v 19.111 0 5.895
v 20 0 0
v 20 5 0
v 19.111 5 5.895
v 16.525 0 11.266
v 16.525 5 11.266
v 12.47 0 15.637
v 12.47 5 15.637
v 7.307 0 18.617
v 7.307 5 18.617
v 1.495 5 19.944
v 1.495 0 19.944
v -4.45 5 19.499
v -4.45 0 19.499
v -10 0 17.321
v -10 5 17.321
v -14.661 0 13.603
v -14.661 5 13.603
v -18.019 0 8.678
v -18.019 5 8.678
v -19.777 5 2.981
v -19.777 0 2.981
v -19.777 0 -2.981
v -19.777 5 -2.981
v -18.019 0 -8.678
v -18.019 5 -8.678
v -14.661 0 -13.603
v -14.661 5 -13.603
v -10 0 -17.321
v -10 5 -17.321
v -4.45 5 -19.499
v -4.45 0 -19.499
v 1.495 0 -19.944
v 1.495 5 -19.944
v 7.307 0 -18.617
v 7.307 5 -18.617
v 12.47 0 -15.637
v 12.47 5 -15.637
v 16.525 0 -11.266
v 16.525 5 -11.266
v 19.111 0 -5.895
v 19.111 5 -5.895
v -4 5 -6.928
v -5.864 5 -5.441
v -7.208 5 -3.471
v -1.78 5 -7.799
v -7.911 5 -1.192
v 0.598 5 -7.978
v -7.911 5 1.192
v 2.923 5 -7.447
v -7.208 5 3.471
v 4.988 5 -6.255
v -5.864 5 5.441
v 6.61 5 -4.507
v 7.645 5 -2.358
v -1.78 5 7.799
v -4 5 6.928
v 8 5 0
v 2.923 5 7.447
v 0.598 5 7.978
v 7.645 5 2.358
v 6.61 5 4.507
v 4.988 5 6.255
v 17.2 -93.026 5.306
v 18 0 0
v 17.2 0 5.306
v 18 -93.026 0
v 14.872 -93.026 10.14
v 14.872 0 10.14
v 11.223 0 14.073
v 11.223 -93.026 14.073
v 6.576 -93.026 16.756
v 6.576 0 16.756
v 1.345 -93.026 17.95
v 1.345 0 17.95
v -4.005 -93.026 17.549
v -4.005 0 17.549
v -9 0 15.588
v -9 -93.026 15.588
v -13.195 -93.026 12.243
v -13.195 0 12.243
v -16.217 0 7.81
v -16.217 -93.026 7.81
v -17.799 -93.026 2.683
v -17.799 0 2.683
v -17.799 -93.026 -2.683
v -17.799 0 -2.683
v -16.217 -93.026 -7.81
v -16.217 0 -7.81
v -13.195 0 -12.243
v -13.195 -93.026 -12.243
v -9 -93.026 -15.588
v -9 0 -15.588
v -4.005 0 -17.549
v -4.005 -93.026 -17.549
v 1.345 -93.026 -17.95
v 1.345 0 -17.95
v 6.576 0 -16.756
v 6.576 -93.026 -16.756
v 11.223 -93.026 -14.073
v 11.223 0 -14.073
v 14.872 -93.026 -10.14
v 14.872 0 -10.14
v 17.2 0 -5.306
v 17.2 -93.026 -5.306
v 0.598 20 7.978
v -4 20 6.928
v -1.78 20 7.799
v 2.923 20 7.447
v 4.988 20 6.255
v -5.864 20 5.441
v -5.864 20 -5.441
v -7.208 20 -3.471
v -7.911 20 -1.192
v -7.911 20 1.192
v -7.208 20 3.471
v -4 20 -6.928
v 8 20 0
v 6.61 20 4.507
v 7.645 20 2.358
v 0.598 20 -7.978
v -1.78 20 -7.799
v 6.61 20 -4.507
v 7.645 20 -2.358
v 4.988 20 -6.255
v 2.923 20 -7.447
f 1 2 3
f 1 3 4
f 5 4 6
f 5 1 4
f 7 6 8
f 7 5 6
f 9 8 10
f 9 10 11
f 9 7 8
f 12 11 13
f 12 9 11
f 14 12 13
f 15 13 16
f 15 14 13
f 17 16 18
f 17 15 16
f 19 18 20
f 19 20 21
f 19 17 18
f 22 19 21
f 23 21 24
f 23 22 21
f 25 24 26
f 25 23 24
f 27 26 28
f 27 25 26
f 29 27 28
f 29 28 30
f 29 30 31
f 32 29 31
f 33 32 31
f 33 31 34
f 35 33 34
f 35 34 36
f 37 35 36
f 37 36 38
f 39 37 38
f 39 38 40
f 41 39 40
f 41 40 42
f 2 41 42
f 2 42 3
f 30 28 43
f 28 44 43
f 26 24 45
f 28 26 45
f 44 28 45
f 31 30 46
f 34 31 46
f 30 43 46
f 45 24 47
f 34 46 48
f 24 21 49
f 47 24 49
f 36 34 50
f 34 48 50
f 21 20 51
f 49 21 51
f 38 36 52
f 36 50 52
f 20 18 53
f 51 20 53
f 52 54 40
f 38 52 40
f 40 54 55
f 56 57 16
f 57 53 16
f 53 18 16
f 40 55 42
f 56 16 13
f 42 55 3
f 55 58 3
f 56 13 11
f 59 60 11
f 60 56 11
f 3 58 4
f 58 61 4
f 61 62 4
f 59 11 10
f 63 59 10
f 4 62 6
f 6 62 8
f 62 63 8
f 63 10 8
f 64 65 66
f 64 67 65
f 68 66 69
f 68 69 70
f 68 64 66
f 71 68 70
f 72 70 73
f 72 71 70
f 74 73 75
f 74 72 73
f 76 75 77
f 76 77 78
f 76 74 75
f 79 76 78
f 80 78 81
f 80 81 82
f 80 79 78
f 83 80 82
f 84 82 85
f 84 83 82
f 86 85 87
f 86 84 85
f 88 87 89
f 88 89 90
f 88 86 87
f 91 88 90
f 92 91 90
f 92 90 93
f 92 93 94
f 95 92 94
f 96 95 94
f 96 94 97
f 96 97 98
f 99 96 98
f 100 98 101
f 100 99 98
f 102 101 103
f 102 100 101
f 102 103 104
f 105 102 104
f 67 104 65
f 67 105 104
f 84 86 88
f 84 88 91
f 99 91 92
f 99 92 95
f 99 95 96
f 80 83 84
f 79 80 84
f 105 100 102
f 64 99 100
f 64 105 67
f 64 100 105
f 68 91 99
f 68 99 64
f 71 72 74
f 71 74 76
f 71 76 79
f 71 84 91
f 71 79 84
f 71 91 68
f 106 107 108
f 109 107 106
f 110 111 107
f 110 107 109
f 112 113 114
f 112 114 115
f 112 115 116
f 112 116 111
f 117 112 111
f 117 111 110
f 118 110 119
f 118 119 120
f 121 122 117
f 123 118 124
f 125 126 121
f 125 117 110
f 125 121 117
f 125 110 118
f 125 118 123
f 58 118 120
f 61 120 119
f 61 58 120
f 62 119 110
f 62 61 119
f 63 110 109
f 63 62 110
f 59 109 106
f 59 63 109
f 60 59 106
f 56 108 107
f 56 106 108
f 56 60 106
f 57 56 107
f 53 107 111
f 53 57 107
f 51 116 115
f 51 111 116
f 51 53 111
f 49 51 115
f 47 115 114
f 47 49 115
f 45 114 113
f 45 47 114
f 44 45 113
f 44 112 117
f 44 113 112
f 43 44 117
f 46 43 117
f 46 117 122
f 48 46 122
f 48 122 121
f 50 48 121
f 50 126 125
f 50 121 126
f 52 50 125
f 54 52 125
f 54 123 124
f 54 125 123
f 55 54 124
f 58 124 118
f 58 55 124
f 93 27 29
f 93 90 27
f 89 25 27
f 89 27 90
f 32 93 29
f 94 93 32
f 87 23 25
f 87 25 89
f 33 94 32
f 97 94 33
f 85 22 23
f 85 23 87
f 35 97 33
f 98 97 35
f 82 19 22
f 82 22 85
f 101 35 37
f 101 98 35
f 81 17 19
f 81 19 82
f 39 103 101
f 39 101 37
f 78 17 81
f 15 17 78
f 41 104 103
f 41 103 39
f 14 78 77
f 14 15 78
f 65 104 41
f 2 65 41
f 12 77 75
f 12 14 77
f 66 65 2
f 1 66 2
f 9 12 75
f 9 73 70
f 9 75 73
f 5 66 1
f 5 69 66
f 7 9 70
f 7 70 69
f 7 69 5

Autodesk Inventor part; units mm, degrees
sketch "Skizze_1" plane through (0, 0, 0) normal (0, 0, 1) x (1, 0, 0)
  line L0 (0, 40) -> (6.773, 40)
  line L1 (6.773, 40) -> (8, 38.773)
  line L2 (8, 38.773) -> (8, 5)
  line L3 (8, 5) -> (20, 5)
  line L4 (20, 5) -> (20, 0)
  line L5 (20, 0) -> (18, 0)
  line L6 (18, 0) -> (18, -93.0264)
  line L7 (18, -93.0264) -> (0, -93.0264)
  line L8 (0, -93.0264) -> (0, 40)
revolve "Revolution1" add sketch "Skizze_1" angle 360 about axis through (0, -93.0264, 0) along (0, -1, 0)
thread "Thread1" size "M16x2" class "6g" standard "ISO Metric profile" full length
sketch "Skizze_2" plane through (0, 40, 0) normal (0, 1, 0) x (1, 0, 0)
  line L0 (-4, -2.3094) -> (0, -4.6188)
  line L1 (0, -4.6188) -> (4, -2.3094)
  line L2 (4, -2.3094) -> (4, 2.3094)
  line L3 (4, 2.3094) -> (0, 4.6188)
  line L4 (0, 4.6188) -> (-4, 2.3094)
  line L5 (-4, 2.3094) -> (-4, -2.3094)
extrude "Extrusion1" cut sketch "Skizze_2" against normal blind 12.4
ref_plane "EPHUB_XY" through (0, 5, 0) normal (0, 1, 0) x (1, 0, 0)
ref_plane "EPHUB_YZ" through (0, 5, 0) normal (1, 0, 0) x (0, 0, -1)
ref_plane "EPHUB_ZX" through (0, 5, 0) normal (0, 0, -1) x (0, 1, 0)
ref_plane "EPZAPFEN_XY" through (0, 0, 0) normal (0, 1, 0) x (1, 0, 0)
ref_plane "EPZAPFEN_YZ" through (0, 0, 0) normal (1, 0, 0) x (0, 0, -1)
ref_plane "EPZAPFEN_ZX" through (0, 0, 0) normal (0, 0, -1) x (0, 1, 0)
sketch "Boceto3" plane through (0, 5, 0) normal (0, 1, 0) x (1, 0, 0)
  point P0 (0, 0)
sketch "Boceto4" plane through (0, 40, 0) normal (0, 1, 0) x (1, 0, 0)
  circle A0 centre (0, 0) radius 8
  dimension "d7" = 16
extrude "Extrusión2" cut sketch "Boceto4" against normal blind 20
properties part number "LZ80_Zapfen"
